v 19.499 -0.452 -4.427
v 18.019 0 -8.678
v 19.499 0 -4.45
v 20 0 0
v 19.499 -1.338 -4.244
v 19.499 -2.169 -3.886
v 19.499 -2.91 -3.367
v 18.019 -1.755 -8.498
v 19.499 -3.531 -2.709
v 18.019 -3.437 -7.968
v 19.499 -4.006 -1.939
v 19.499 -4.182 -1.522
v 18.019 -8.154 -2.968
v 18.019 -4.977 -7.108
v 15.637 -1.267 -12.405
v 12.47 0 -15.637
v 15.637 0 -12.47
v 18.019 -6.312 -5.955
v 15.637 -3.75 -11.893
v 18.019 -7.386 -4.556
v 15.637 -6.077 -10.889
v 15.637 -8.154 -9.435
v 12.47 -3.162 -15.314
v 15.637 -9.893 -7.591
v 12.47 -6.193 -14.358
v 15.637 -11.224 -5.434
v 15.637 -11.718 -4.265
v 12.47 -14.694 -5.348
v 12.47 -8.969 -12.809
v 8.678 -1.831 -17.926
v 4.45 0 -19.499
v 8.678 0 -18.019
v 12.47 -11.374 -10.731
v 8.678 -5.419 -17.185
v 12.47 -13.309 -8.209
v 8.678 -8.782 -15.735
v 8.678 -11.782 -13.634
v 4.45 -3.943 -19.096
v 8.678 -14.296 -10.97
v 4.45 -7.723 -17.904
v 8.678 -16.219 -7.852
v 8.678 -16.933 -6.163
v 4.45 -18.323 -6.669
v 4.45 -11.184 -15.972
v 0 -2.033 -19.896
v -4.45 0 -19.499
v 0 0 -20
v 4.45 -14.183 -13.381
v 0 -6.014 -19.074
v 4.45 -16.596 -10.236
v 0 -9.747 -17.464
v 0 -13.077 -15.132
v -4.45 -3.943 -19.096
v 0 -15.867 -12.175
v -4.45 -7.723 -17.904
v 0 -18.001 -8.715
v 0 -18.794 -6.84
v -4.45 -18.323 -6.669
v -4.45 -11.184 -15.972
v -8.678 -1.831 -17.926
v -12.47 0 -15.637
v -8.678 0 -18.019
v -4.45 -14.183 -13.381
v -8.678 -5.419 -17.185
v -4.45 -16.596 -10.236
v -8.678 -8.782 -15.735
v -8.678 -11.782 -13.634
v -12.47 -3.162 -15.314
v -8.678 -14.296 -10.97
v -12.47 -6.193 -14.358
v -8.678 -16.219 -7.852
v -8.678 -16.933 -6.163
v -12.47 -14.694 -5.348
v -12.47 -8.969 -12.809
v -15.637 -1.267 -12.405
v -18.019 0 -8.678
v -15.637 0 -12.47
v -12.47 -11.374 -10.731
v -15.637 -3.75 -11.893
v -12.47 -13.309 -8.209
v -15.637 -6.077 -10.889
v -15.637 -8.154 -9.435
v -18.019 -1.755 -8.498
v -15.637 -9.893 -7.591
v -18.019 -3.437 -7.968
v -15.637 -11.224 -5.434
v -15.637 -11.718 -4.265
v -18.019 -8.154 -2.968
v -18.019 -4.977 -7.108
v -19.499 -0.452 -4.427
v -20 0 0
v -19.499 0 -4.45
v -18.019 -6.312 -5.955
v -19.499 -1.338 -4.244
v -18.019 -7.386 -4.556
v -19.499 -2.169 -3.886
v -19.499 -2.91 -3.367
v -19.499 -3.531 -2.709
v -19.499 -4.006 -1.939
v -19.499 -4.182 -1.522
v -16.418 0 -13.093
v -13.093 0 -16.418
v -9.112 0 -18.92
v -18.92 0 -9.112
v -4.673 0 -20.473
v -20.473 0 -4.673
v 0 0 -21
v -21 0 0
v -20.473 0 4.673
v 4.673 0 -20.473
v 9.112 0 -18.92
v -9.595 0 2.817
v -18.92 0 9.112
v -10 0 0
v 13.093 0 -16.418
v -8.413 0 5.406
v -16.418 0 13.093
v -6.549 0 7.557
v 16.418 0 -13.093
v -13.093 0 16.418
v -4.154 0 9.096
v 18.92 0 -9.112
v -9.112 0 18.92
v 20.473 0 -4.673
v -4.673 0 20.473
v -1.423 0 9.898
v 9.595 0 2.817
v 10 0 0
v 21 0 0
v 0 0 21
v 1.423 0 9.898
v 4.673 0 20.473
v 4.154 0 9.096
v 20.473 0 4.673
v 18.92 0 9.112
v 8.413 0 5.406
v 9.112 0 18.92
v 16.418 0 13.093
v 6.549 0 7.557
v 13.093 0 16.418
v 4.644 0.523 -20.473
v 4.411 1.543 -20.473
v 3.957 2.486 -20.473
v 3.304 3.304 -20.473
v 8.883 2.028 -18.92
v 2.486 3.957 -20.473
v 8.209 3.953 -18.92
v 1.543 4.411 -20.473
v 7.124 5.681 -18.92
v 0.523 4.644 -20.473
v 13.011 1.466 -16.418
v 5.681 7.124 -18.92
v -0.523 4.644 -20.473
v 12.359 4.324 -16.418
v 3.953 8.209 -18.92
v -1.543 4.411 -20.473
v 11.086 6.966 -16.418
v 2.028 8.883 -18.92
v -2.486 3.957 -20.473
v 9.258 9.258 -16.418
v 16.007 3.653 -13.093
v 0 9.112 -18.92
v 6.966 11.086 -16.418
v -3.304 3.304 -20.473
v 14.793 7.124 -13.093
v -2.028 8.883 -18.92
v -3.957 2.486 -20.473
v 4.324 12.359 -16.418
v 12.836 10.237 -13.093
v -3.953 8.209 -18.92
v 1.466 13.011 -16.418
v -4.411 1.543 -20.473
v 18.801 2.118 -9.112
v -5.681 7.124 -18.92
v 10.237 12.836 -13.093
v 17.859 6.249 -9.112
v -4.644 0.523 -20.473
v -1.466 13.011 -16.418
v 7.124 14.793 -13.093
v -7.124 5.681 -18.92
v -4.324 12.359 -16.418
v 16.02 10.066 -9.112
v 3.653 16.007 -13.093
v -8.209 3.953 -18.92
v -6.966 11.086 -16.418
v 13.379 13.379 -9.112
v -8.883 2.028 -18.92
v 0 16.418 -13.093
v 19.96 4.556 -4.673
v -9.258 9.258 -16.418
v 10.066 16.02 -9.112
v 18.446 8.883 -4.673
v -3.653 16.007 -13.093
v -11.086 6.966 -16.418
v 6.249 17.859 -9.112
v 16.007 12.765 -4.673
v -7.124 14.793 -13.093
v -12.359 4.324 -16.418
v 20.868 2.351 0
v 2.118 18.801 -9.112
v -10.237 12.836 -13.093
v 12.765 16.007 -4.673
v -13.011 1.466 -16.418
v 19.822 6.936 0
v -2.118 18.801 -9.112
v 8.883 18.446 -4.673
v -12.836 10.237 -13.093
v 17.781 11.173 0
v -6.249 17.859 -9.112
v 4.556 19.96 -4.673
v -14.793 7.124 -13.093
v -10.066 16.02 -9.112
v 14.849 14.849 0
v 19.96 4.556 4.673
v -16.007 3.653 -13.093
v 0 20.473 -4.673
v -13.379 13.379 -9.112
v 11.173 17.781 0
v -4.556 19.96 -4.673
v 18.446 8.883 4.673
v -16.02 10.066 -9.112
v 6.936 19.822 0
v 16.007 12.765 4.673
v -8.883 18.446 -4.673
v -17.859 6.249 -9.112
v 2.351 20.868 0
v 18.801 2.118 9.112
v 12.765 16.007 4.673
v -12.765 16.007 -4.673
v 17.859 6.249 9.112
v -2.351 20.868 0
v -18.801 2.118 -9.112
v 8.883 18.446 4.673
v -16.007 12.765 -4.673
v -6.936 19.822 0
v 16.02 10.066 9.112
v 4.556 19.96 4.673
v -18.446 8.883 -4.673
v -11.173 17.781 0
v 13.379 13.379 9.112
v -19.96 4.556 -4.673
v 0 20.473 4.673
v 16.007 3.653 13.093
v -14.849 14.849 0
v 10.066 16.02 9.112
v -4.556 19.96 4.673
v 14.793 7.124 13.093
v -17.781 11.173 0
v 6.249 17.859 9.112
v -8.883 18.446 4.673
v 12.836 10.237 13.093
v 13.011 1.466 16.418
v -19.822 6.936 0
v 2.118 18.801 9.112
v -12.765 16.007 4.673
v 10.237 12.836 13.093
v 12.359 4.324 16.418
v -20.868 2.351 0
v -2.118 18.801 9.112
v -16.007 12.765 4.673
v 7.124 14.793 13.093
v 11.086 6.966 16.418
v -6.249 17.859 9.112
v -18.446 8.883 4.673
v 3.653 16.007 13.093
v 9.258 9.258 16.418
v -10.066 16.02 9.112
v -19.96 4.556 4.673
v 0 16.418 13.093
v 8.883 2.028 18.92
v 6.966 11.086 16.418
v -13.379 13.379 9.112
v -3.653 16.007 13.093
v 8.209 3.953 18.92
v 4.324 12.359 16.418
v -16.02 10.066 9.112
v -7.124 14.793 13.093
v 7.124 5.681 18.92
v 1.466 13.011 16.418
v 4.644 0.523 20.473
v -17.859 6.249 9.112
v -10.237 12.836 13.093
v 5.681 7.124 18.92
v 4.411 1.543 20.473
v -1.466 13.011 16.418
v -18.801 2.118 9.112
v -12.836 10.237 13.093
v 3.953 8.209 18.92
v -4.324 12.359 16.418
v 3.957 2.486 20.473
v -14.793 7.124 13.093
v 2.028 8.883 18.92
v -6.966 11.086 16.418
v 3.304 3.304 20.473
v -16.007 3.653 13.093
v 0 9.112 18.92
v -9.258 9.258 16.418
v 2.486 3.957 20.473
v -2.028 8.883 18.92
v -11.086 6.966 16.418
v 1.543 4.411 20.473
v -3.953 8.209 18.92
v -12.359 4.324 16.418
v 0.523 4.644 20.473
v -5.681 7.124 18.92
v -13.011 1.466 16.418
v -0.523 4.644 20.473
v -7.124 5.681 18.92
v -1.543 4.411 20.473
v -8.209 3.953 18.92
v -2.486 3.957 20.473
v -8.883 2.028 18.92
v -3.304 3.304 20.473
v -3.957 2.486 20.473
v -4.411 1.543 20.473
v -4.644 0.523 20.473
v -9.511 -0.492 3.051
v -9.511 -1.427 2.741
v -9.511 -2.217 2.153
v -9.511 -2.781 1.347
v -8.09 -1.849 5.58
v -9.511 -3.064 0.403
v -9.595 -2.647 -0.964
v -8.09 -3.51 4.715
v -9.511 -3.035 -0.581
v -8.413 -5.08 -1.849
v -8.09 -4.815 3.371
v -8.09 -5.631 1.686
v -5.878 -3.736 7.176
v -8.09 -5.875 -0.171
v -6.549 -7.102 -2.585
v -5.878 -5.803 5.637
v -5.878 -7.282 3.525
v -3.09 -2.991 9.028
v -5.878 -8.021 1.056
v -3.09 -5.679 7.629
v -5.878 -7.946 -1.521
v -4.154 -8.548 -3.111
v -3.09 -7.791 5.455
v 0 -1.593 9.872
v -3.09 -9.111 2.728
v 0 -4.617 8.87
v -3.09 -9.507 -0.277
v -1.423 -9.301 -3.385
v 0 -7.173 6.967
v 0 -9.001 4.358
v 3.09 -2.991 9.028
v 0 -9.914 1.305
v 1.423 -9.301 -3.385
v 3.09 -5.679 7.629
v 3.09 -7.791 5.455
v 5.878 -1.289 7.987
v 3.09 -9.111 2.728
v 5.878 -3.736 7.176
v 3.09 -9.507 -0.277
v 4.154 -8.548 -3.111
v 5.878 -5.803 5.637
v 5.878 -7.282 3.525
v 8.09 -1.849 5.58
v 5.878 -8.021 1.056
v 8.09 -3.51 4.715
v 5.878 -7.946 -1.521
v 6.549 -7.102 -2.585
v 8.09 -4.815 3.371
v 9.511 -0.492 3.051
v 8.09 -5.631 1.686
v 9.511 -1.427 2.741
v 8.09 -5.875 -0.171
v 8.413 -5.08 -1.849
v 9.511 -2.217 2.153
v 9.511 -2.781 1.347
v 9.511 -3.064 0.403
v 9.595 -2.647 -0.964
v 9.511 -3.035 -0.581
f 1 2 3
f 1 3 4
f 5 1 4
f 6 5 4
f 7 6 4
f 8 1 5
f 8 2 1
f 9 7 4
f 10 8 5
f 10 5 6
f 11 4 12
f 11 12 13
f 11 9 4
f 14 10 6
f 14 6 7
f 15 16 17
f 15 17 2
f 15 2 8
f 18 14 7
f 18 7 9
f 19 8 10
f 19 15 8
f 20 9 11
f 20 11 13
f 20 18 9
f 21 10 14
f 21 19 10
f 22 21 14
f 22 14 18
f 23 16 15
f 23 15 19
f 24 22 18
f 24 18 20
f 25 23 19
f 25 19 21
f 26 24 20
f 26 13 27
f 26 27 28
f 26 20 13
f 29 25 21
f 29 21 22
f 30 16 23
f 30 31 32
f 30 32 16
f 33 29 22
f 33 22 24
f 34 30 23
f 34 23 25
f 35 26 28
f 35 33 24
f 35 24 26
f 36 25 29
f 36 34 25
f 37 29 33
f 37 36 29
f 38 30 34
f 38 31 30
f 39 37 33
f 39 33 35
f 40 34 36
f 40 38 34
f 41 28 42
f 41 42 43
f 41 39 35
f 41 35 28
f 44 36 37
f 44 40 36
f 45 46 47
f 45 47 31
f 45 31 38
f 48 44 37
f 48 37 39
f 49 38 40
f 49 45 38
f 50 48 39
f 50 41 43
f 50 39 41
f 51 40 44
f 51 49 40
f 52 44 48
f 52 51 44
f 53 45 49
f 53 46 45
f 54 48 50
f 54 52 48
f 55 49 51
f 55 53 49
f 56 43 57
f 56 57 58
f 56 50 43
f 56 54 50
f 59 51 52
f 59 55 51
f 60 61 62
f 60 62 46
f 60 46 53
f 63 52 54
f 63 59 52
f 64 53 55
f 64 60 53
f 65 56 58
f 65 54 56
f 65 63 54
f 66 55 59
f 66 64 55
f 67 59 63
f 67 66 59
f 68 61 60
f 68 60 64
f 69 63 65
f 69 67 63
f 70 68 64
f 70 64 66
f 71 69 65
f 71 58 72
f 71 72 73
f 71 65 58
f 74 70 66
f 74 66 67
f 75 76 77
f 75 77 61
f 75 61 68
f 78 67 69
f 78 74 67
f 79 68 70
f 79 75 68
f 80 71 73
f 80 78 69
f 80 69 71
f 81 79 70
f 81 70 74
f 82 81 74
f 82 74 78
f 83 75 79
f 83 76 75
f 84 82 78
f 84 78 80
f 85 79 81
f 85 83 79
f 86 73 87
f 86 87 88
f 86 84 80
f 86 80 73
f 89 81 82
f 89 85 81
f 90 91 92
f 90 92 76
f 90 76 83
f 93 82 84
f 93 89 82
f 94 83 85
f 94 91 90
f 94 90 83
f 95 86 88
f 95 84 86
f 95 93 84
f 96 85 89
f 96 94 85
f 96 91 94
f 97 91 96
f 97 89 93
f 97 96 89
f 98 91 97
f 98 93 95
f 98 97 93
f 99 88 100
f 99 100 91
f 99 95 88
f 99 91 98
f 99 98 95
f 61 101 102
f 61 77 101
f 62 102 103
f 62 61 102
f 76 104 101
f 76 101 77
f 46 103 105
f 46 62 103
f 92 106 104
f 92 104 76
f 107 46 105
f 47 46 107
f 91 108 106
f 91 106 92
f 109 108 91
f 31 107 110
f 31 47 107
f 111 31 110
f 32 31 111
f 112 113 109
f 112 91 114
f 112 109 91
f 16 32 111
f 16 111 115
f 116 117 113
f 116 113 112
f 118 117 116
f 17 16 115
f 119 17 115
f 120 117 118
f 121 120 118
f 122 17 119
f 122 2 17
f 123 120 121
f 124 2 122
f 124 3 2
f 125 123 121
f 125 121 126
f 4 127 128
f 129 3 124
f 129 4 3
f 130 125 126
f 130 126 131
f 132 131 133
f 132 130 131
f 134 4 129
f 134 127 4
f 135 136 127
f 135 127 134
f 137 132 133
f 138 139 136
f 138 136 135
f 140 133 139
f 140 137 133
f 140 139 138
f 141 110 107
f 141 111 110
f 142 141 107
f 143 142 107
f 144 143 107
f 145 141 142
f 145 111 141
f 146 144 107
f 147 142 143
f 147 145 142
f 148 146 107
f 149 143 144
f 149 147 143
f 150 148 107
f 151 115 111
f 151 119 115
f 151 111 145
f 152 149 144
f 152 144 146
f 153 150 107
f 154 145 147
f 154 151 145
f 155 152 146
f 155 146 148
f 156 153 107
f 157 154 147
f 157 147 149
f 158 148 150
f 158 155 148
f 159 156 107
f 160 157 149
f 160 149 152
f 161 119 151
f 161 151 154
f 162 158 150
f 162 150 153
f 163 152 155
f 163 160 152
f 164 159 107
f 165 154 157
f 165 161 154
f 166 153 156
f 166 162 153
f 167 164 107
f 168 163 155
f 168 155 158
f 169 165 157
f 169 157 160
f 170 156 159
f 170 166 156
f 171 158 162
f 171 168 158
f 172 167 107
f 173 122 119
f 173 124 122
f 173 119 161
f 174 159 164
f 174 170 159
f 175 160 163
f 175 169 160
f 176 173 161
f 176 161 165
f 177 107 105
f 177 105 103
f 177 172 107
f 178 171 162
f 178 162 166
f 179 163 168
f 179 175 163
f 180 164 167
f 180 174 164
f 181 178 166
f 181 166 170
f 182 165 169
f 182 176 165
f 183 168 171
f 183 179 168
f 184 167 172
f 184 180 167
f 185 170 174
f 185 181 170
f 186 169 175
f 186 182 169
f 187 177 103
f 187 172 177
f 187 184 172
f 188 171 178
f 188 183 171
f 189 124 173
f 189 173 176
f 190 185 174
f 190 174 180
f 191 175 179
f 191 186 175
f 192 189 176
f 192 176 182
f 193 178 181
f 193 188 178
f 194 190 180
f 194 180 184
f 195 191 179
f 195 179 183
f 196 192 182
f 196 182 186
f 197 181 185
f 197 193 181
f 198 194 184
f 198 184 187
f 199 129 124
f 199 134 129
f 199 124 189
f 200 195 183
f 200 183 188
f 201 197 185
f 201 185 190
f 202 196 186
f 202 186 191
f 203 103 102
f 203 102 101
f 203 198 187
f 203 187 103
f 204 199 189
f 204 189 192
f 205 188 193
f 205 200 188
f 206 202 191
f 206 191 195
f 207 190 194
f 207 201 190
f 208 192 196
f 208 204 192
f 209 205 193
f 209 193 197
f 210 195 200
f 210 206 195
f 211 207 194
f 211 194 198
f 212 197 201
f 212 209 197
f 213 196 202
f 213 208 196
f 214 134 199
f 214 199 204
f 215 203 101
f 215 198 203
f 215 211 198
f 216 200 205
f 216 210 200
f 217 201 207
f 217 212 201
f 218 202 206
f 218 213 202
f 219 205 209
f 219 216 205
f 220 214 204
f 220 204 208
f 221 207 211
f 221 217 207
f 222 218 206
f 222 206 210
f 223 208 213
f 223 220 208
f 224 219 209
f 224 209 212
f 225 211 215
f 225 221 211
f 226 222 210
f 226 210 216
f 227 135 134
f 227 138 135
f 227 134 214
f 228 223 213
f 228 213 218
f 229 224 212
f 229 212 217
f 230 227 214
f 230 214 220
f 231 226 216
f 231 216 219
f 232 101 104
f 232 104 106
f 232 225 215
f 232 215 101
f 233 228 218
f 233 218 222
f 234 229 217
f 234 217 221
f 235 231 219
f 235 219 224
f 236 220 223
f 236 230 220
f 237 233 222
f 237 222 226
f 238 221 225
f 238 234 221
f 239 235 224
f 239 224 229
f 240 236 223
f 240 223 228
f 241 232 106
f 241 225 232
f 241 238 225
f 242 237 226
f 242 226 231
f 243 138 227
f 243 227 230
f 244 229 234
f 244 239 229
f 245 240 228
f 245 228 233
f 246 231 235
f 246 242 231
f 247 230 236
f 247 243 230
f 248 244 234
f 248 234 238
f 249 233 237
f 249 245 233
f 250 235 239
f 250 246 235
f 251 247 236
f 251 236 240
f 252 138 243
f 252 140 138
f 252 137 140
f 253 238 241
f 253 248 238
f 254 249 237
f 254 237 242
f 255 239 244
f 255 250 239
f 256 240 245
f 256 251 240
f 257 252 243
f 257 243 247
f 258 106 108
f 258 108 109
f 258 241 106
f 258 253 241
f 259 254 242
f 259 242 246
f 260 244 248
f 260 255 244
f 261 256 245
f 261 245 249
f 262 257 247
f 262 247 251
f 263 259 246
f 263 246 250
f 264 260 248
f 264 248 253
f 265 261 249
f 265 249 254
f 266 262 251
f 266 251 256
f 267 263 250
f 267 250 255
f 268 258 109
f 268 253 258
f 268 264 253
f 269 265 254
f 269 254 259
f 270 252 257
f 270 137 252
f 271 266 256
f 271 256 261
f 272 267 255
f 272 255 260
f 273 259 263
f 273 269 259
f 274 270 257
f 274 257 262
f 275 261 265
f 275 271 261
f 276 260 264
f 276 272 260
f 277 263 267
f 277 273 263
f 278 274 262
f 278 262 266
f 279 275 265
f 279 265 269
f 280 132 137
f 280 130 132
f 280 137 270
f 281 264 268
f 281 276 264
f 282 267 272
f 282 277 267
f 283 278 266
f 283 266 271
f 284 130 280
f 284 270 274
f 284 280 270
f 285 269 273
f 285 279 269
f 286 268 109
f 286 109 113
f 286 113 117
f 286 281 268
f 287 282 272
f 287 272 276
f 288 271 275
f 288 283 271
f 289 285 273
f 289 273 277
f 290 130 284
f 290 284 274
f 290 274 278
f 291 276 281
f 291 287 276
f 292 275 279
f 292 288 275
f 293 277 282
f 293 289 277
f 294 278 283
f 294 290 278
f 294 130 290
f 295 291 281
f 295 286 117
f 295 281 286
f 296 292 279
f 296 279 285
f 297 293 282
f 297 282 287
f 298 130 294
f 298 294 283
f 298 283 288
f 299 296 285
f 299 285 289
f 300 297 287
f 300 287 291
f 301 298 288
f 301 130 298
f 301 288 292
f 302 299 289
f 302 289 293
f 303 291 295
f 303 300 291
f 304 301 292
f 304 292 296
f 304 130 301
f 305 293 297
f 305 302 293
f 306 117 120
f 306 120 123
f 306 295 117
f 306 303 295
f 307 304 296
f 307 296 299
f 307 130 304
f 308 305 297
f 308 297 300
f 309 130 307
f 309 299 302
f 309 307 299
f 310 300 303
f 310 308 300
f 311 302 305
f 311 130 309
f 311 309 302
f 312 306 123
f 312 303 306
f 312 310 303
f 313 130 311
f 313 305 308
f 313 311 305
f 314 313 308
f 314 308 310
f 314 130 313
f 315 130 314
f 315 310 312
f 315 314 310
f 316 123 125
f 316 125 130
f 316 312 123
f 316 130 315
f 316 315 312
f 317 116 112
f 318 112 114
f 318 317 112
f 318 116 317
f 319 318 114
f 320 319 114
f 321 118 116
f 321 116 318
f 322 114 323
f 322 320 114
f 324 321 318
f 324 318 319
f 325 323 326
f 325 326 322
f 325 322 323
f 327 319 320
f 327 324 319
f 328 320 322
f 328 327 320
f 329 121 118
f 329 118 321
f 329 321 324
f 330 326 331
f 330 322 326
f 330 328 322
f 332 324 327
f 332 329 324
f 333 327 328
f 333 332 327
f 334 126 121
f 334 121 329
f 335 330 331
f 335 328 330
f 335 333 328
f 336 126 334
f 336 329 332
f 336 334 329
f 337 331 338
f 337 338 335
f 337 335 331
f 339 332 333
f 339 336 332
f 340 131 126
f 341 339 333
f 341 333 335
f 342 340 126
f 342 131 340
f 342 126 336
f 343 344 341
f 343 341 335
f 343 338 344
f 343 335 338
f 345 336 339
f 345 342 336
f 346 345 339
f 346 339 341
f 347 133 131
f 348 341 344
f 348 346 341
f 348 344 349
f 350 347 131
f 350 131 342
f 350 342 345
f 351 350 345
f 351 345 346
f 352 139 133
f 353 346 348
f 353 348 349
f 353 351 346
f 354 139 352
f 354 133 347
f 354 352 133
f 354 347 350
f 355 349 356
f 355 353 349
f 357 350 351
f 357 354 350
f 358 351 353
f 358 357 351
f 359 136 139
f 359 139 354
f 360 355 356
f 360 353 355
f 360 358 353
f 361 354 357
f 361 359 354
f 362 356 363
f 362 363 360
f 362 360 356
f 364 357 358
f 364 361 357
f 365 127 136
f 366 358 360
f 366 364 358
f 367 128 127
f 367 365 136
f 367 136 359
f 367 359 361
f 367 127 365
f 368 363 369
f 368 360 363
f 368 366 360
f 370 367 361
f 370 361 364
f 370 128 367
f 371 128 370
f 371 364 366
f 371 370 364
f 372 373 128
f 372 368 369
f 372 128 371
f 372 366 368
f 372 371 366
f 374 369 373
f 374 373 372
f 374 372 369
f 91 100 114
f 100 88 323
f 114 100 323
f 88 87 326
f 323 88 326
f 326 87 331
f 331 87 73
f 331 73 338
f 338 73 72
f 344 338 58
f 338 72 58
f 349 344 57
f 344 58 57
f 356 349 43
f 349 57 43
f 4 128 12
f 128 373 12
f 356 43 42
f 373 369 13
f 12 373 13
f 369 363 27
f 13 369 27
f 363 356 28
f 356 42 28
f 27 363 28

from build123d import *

# Parameters (mm, degrees)
F1_ANGLE = -180
F3_ANGLE = 250


with BuildPart() as f1:
    # F0 (on Front) → F1 (revolve)
    with BuildSketch(Plane.XZ):
        with BuildLine():
            Line((0, -20), (0, -21))
            ThreePointArc((0, -21), (21, 0), (0, 21))
            Line((0, 21), (0, 20))
            ThreePointArc((0, 20), (20, 0), (0, -20))
        make_face()
    revolve(axis=Axis((0, 0, 0), (0, 0, -1)), revolution_arc=F1_ANGLE)

    # F2 (on Front) → F3 (revolve)
    with BuildSketch(Plane.XZ):
        with BuildLine():
            Line((10, 0), (20, 0))
            ThreePointArc((20, 0), (0, 20), (-20, 0))
            Line((-20, 0), (-10, 0))
            ThreePointArc((-10, 0), (0, 10), (10, 0))
        make_face()
    revolve(axis=Axis((0, 0, 0), (-1, 0, 0)), revolution_arc=F3_ANGLE)

    # F4 (on Front) → F5 (revolve)
    with BuildSketch(Plane.XZ):
        with BuildLine():
            Line((10, 0), (-10, 0))
            ThreePointArc((-10, 0), (0, -10), (10, 0))
        make_face()
    revolve(axis=Axis((0, 0, 0), (1, 0, 0)))


solid = f1.part
